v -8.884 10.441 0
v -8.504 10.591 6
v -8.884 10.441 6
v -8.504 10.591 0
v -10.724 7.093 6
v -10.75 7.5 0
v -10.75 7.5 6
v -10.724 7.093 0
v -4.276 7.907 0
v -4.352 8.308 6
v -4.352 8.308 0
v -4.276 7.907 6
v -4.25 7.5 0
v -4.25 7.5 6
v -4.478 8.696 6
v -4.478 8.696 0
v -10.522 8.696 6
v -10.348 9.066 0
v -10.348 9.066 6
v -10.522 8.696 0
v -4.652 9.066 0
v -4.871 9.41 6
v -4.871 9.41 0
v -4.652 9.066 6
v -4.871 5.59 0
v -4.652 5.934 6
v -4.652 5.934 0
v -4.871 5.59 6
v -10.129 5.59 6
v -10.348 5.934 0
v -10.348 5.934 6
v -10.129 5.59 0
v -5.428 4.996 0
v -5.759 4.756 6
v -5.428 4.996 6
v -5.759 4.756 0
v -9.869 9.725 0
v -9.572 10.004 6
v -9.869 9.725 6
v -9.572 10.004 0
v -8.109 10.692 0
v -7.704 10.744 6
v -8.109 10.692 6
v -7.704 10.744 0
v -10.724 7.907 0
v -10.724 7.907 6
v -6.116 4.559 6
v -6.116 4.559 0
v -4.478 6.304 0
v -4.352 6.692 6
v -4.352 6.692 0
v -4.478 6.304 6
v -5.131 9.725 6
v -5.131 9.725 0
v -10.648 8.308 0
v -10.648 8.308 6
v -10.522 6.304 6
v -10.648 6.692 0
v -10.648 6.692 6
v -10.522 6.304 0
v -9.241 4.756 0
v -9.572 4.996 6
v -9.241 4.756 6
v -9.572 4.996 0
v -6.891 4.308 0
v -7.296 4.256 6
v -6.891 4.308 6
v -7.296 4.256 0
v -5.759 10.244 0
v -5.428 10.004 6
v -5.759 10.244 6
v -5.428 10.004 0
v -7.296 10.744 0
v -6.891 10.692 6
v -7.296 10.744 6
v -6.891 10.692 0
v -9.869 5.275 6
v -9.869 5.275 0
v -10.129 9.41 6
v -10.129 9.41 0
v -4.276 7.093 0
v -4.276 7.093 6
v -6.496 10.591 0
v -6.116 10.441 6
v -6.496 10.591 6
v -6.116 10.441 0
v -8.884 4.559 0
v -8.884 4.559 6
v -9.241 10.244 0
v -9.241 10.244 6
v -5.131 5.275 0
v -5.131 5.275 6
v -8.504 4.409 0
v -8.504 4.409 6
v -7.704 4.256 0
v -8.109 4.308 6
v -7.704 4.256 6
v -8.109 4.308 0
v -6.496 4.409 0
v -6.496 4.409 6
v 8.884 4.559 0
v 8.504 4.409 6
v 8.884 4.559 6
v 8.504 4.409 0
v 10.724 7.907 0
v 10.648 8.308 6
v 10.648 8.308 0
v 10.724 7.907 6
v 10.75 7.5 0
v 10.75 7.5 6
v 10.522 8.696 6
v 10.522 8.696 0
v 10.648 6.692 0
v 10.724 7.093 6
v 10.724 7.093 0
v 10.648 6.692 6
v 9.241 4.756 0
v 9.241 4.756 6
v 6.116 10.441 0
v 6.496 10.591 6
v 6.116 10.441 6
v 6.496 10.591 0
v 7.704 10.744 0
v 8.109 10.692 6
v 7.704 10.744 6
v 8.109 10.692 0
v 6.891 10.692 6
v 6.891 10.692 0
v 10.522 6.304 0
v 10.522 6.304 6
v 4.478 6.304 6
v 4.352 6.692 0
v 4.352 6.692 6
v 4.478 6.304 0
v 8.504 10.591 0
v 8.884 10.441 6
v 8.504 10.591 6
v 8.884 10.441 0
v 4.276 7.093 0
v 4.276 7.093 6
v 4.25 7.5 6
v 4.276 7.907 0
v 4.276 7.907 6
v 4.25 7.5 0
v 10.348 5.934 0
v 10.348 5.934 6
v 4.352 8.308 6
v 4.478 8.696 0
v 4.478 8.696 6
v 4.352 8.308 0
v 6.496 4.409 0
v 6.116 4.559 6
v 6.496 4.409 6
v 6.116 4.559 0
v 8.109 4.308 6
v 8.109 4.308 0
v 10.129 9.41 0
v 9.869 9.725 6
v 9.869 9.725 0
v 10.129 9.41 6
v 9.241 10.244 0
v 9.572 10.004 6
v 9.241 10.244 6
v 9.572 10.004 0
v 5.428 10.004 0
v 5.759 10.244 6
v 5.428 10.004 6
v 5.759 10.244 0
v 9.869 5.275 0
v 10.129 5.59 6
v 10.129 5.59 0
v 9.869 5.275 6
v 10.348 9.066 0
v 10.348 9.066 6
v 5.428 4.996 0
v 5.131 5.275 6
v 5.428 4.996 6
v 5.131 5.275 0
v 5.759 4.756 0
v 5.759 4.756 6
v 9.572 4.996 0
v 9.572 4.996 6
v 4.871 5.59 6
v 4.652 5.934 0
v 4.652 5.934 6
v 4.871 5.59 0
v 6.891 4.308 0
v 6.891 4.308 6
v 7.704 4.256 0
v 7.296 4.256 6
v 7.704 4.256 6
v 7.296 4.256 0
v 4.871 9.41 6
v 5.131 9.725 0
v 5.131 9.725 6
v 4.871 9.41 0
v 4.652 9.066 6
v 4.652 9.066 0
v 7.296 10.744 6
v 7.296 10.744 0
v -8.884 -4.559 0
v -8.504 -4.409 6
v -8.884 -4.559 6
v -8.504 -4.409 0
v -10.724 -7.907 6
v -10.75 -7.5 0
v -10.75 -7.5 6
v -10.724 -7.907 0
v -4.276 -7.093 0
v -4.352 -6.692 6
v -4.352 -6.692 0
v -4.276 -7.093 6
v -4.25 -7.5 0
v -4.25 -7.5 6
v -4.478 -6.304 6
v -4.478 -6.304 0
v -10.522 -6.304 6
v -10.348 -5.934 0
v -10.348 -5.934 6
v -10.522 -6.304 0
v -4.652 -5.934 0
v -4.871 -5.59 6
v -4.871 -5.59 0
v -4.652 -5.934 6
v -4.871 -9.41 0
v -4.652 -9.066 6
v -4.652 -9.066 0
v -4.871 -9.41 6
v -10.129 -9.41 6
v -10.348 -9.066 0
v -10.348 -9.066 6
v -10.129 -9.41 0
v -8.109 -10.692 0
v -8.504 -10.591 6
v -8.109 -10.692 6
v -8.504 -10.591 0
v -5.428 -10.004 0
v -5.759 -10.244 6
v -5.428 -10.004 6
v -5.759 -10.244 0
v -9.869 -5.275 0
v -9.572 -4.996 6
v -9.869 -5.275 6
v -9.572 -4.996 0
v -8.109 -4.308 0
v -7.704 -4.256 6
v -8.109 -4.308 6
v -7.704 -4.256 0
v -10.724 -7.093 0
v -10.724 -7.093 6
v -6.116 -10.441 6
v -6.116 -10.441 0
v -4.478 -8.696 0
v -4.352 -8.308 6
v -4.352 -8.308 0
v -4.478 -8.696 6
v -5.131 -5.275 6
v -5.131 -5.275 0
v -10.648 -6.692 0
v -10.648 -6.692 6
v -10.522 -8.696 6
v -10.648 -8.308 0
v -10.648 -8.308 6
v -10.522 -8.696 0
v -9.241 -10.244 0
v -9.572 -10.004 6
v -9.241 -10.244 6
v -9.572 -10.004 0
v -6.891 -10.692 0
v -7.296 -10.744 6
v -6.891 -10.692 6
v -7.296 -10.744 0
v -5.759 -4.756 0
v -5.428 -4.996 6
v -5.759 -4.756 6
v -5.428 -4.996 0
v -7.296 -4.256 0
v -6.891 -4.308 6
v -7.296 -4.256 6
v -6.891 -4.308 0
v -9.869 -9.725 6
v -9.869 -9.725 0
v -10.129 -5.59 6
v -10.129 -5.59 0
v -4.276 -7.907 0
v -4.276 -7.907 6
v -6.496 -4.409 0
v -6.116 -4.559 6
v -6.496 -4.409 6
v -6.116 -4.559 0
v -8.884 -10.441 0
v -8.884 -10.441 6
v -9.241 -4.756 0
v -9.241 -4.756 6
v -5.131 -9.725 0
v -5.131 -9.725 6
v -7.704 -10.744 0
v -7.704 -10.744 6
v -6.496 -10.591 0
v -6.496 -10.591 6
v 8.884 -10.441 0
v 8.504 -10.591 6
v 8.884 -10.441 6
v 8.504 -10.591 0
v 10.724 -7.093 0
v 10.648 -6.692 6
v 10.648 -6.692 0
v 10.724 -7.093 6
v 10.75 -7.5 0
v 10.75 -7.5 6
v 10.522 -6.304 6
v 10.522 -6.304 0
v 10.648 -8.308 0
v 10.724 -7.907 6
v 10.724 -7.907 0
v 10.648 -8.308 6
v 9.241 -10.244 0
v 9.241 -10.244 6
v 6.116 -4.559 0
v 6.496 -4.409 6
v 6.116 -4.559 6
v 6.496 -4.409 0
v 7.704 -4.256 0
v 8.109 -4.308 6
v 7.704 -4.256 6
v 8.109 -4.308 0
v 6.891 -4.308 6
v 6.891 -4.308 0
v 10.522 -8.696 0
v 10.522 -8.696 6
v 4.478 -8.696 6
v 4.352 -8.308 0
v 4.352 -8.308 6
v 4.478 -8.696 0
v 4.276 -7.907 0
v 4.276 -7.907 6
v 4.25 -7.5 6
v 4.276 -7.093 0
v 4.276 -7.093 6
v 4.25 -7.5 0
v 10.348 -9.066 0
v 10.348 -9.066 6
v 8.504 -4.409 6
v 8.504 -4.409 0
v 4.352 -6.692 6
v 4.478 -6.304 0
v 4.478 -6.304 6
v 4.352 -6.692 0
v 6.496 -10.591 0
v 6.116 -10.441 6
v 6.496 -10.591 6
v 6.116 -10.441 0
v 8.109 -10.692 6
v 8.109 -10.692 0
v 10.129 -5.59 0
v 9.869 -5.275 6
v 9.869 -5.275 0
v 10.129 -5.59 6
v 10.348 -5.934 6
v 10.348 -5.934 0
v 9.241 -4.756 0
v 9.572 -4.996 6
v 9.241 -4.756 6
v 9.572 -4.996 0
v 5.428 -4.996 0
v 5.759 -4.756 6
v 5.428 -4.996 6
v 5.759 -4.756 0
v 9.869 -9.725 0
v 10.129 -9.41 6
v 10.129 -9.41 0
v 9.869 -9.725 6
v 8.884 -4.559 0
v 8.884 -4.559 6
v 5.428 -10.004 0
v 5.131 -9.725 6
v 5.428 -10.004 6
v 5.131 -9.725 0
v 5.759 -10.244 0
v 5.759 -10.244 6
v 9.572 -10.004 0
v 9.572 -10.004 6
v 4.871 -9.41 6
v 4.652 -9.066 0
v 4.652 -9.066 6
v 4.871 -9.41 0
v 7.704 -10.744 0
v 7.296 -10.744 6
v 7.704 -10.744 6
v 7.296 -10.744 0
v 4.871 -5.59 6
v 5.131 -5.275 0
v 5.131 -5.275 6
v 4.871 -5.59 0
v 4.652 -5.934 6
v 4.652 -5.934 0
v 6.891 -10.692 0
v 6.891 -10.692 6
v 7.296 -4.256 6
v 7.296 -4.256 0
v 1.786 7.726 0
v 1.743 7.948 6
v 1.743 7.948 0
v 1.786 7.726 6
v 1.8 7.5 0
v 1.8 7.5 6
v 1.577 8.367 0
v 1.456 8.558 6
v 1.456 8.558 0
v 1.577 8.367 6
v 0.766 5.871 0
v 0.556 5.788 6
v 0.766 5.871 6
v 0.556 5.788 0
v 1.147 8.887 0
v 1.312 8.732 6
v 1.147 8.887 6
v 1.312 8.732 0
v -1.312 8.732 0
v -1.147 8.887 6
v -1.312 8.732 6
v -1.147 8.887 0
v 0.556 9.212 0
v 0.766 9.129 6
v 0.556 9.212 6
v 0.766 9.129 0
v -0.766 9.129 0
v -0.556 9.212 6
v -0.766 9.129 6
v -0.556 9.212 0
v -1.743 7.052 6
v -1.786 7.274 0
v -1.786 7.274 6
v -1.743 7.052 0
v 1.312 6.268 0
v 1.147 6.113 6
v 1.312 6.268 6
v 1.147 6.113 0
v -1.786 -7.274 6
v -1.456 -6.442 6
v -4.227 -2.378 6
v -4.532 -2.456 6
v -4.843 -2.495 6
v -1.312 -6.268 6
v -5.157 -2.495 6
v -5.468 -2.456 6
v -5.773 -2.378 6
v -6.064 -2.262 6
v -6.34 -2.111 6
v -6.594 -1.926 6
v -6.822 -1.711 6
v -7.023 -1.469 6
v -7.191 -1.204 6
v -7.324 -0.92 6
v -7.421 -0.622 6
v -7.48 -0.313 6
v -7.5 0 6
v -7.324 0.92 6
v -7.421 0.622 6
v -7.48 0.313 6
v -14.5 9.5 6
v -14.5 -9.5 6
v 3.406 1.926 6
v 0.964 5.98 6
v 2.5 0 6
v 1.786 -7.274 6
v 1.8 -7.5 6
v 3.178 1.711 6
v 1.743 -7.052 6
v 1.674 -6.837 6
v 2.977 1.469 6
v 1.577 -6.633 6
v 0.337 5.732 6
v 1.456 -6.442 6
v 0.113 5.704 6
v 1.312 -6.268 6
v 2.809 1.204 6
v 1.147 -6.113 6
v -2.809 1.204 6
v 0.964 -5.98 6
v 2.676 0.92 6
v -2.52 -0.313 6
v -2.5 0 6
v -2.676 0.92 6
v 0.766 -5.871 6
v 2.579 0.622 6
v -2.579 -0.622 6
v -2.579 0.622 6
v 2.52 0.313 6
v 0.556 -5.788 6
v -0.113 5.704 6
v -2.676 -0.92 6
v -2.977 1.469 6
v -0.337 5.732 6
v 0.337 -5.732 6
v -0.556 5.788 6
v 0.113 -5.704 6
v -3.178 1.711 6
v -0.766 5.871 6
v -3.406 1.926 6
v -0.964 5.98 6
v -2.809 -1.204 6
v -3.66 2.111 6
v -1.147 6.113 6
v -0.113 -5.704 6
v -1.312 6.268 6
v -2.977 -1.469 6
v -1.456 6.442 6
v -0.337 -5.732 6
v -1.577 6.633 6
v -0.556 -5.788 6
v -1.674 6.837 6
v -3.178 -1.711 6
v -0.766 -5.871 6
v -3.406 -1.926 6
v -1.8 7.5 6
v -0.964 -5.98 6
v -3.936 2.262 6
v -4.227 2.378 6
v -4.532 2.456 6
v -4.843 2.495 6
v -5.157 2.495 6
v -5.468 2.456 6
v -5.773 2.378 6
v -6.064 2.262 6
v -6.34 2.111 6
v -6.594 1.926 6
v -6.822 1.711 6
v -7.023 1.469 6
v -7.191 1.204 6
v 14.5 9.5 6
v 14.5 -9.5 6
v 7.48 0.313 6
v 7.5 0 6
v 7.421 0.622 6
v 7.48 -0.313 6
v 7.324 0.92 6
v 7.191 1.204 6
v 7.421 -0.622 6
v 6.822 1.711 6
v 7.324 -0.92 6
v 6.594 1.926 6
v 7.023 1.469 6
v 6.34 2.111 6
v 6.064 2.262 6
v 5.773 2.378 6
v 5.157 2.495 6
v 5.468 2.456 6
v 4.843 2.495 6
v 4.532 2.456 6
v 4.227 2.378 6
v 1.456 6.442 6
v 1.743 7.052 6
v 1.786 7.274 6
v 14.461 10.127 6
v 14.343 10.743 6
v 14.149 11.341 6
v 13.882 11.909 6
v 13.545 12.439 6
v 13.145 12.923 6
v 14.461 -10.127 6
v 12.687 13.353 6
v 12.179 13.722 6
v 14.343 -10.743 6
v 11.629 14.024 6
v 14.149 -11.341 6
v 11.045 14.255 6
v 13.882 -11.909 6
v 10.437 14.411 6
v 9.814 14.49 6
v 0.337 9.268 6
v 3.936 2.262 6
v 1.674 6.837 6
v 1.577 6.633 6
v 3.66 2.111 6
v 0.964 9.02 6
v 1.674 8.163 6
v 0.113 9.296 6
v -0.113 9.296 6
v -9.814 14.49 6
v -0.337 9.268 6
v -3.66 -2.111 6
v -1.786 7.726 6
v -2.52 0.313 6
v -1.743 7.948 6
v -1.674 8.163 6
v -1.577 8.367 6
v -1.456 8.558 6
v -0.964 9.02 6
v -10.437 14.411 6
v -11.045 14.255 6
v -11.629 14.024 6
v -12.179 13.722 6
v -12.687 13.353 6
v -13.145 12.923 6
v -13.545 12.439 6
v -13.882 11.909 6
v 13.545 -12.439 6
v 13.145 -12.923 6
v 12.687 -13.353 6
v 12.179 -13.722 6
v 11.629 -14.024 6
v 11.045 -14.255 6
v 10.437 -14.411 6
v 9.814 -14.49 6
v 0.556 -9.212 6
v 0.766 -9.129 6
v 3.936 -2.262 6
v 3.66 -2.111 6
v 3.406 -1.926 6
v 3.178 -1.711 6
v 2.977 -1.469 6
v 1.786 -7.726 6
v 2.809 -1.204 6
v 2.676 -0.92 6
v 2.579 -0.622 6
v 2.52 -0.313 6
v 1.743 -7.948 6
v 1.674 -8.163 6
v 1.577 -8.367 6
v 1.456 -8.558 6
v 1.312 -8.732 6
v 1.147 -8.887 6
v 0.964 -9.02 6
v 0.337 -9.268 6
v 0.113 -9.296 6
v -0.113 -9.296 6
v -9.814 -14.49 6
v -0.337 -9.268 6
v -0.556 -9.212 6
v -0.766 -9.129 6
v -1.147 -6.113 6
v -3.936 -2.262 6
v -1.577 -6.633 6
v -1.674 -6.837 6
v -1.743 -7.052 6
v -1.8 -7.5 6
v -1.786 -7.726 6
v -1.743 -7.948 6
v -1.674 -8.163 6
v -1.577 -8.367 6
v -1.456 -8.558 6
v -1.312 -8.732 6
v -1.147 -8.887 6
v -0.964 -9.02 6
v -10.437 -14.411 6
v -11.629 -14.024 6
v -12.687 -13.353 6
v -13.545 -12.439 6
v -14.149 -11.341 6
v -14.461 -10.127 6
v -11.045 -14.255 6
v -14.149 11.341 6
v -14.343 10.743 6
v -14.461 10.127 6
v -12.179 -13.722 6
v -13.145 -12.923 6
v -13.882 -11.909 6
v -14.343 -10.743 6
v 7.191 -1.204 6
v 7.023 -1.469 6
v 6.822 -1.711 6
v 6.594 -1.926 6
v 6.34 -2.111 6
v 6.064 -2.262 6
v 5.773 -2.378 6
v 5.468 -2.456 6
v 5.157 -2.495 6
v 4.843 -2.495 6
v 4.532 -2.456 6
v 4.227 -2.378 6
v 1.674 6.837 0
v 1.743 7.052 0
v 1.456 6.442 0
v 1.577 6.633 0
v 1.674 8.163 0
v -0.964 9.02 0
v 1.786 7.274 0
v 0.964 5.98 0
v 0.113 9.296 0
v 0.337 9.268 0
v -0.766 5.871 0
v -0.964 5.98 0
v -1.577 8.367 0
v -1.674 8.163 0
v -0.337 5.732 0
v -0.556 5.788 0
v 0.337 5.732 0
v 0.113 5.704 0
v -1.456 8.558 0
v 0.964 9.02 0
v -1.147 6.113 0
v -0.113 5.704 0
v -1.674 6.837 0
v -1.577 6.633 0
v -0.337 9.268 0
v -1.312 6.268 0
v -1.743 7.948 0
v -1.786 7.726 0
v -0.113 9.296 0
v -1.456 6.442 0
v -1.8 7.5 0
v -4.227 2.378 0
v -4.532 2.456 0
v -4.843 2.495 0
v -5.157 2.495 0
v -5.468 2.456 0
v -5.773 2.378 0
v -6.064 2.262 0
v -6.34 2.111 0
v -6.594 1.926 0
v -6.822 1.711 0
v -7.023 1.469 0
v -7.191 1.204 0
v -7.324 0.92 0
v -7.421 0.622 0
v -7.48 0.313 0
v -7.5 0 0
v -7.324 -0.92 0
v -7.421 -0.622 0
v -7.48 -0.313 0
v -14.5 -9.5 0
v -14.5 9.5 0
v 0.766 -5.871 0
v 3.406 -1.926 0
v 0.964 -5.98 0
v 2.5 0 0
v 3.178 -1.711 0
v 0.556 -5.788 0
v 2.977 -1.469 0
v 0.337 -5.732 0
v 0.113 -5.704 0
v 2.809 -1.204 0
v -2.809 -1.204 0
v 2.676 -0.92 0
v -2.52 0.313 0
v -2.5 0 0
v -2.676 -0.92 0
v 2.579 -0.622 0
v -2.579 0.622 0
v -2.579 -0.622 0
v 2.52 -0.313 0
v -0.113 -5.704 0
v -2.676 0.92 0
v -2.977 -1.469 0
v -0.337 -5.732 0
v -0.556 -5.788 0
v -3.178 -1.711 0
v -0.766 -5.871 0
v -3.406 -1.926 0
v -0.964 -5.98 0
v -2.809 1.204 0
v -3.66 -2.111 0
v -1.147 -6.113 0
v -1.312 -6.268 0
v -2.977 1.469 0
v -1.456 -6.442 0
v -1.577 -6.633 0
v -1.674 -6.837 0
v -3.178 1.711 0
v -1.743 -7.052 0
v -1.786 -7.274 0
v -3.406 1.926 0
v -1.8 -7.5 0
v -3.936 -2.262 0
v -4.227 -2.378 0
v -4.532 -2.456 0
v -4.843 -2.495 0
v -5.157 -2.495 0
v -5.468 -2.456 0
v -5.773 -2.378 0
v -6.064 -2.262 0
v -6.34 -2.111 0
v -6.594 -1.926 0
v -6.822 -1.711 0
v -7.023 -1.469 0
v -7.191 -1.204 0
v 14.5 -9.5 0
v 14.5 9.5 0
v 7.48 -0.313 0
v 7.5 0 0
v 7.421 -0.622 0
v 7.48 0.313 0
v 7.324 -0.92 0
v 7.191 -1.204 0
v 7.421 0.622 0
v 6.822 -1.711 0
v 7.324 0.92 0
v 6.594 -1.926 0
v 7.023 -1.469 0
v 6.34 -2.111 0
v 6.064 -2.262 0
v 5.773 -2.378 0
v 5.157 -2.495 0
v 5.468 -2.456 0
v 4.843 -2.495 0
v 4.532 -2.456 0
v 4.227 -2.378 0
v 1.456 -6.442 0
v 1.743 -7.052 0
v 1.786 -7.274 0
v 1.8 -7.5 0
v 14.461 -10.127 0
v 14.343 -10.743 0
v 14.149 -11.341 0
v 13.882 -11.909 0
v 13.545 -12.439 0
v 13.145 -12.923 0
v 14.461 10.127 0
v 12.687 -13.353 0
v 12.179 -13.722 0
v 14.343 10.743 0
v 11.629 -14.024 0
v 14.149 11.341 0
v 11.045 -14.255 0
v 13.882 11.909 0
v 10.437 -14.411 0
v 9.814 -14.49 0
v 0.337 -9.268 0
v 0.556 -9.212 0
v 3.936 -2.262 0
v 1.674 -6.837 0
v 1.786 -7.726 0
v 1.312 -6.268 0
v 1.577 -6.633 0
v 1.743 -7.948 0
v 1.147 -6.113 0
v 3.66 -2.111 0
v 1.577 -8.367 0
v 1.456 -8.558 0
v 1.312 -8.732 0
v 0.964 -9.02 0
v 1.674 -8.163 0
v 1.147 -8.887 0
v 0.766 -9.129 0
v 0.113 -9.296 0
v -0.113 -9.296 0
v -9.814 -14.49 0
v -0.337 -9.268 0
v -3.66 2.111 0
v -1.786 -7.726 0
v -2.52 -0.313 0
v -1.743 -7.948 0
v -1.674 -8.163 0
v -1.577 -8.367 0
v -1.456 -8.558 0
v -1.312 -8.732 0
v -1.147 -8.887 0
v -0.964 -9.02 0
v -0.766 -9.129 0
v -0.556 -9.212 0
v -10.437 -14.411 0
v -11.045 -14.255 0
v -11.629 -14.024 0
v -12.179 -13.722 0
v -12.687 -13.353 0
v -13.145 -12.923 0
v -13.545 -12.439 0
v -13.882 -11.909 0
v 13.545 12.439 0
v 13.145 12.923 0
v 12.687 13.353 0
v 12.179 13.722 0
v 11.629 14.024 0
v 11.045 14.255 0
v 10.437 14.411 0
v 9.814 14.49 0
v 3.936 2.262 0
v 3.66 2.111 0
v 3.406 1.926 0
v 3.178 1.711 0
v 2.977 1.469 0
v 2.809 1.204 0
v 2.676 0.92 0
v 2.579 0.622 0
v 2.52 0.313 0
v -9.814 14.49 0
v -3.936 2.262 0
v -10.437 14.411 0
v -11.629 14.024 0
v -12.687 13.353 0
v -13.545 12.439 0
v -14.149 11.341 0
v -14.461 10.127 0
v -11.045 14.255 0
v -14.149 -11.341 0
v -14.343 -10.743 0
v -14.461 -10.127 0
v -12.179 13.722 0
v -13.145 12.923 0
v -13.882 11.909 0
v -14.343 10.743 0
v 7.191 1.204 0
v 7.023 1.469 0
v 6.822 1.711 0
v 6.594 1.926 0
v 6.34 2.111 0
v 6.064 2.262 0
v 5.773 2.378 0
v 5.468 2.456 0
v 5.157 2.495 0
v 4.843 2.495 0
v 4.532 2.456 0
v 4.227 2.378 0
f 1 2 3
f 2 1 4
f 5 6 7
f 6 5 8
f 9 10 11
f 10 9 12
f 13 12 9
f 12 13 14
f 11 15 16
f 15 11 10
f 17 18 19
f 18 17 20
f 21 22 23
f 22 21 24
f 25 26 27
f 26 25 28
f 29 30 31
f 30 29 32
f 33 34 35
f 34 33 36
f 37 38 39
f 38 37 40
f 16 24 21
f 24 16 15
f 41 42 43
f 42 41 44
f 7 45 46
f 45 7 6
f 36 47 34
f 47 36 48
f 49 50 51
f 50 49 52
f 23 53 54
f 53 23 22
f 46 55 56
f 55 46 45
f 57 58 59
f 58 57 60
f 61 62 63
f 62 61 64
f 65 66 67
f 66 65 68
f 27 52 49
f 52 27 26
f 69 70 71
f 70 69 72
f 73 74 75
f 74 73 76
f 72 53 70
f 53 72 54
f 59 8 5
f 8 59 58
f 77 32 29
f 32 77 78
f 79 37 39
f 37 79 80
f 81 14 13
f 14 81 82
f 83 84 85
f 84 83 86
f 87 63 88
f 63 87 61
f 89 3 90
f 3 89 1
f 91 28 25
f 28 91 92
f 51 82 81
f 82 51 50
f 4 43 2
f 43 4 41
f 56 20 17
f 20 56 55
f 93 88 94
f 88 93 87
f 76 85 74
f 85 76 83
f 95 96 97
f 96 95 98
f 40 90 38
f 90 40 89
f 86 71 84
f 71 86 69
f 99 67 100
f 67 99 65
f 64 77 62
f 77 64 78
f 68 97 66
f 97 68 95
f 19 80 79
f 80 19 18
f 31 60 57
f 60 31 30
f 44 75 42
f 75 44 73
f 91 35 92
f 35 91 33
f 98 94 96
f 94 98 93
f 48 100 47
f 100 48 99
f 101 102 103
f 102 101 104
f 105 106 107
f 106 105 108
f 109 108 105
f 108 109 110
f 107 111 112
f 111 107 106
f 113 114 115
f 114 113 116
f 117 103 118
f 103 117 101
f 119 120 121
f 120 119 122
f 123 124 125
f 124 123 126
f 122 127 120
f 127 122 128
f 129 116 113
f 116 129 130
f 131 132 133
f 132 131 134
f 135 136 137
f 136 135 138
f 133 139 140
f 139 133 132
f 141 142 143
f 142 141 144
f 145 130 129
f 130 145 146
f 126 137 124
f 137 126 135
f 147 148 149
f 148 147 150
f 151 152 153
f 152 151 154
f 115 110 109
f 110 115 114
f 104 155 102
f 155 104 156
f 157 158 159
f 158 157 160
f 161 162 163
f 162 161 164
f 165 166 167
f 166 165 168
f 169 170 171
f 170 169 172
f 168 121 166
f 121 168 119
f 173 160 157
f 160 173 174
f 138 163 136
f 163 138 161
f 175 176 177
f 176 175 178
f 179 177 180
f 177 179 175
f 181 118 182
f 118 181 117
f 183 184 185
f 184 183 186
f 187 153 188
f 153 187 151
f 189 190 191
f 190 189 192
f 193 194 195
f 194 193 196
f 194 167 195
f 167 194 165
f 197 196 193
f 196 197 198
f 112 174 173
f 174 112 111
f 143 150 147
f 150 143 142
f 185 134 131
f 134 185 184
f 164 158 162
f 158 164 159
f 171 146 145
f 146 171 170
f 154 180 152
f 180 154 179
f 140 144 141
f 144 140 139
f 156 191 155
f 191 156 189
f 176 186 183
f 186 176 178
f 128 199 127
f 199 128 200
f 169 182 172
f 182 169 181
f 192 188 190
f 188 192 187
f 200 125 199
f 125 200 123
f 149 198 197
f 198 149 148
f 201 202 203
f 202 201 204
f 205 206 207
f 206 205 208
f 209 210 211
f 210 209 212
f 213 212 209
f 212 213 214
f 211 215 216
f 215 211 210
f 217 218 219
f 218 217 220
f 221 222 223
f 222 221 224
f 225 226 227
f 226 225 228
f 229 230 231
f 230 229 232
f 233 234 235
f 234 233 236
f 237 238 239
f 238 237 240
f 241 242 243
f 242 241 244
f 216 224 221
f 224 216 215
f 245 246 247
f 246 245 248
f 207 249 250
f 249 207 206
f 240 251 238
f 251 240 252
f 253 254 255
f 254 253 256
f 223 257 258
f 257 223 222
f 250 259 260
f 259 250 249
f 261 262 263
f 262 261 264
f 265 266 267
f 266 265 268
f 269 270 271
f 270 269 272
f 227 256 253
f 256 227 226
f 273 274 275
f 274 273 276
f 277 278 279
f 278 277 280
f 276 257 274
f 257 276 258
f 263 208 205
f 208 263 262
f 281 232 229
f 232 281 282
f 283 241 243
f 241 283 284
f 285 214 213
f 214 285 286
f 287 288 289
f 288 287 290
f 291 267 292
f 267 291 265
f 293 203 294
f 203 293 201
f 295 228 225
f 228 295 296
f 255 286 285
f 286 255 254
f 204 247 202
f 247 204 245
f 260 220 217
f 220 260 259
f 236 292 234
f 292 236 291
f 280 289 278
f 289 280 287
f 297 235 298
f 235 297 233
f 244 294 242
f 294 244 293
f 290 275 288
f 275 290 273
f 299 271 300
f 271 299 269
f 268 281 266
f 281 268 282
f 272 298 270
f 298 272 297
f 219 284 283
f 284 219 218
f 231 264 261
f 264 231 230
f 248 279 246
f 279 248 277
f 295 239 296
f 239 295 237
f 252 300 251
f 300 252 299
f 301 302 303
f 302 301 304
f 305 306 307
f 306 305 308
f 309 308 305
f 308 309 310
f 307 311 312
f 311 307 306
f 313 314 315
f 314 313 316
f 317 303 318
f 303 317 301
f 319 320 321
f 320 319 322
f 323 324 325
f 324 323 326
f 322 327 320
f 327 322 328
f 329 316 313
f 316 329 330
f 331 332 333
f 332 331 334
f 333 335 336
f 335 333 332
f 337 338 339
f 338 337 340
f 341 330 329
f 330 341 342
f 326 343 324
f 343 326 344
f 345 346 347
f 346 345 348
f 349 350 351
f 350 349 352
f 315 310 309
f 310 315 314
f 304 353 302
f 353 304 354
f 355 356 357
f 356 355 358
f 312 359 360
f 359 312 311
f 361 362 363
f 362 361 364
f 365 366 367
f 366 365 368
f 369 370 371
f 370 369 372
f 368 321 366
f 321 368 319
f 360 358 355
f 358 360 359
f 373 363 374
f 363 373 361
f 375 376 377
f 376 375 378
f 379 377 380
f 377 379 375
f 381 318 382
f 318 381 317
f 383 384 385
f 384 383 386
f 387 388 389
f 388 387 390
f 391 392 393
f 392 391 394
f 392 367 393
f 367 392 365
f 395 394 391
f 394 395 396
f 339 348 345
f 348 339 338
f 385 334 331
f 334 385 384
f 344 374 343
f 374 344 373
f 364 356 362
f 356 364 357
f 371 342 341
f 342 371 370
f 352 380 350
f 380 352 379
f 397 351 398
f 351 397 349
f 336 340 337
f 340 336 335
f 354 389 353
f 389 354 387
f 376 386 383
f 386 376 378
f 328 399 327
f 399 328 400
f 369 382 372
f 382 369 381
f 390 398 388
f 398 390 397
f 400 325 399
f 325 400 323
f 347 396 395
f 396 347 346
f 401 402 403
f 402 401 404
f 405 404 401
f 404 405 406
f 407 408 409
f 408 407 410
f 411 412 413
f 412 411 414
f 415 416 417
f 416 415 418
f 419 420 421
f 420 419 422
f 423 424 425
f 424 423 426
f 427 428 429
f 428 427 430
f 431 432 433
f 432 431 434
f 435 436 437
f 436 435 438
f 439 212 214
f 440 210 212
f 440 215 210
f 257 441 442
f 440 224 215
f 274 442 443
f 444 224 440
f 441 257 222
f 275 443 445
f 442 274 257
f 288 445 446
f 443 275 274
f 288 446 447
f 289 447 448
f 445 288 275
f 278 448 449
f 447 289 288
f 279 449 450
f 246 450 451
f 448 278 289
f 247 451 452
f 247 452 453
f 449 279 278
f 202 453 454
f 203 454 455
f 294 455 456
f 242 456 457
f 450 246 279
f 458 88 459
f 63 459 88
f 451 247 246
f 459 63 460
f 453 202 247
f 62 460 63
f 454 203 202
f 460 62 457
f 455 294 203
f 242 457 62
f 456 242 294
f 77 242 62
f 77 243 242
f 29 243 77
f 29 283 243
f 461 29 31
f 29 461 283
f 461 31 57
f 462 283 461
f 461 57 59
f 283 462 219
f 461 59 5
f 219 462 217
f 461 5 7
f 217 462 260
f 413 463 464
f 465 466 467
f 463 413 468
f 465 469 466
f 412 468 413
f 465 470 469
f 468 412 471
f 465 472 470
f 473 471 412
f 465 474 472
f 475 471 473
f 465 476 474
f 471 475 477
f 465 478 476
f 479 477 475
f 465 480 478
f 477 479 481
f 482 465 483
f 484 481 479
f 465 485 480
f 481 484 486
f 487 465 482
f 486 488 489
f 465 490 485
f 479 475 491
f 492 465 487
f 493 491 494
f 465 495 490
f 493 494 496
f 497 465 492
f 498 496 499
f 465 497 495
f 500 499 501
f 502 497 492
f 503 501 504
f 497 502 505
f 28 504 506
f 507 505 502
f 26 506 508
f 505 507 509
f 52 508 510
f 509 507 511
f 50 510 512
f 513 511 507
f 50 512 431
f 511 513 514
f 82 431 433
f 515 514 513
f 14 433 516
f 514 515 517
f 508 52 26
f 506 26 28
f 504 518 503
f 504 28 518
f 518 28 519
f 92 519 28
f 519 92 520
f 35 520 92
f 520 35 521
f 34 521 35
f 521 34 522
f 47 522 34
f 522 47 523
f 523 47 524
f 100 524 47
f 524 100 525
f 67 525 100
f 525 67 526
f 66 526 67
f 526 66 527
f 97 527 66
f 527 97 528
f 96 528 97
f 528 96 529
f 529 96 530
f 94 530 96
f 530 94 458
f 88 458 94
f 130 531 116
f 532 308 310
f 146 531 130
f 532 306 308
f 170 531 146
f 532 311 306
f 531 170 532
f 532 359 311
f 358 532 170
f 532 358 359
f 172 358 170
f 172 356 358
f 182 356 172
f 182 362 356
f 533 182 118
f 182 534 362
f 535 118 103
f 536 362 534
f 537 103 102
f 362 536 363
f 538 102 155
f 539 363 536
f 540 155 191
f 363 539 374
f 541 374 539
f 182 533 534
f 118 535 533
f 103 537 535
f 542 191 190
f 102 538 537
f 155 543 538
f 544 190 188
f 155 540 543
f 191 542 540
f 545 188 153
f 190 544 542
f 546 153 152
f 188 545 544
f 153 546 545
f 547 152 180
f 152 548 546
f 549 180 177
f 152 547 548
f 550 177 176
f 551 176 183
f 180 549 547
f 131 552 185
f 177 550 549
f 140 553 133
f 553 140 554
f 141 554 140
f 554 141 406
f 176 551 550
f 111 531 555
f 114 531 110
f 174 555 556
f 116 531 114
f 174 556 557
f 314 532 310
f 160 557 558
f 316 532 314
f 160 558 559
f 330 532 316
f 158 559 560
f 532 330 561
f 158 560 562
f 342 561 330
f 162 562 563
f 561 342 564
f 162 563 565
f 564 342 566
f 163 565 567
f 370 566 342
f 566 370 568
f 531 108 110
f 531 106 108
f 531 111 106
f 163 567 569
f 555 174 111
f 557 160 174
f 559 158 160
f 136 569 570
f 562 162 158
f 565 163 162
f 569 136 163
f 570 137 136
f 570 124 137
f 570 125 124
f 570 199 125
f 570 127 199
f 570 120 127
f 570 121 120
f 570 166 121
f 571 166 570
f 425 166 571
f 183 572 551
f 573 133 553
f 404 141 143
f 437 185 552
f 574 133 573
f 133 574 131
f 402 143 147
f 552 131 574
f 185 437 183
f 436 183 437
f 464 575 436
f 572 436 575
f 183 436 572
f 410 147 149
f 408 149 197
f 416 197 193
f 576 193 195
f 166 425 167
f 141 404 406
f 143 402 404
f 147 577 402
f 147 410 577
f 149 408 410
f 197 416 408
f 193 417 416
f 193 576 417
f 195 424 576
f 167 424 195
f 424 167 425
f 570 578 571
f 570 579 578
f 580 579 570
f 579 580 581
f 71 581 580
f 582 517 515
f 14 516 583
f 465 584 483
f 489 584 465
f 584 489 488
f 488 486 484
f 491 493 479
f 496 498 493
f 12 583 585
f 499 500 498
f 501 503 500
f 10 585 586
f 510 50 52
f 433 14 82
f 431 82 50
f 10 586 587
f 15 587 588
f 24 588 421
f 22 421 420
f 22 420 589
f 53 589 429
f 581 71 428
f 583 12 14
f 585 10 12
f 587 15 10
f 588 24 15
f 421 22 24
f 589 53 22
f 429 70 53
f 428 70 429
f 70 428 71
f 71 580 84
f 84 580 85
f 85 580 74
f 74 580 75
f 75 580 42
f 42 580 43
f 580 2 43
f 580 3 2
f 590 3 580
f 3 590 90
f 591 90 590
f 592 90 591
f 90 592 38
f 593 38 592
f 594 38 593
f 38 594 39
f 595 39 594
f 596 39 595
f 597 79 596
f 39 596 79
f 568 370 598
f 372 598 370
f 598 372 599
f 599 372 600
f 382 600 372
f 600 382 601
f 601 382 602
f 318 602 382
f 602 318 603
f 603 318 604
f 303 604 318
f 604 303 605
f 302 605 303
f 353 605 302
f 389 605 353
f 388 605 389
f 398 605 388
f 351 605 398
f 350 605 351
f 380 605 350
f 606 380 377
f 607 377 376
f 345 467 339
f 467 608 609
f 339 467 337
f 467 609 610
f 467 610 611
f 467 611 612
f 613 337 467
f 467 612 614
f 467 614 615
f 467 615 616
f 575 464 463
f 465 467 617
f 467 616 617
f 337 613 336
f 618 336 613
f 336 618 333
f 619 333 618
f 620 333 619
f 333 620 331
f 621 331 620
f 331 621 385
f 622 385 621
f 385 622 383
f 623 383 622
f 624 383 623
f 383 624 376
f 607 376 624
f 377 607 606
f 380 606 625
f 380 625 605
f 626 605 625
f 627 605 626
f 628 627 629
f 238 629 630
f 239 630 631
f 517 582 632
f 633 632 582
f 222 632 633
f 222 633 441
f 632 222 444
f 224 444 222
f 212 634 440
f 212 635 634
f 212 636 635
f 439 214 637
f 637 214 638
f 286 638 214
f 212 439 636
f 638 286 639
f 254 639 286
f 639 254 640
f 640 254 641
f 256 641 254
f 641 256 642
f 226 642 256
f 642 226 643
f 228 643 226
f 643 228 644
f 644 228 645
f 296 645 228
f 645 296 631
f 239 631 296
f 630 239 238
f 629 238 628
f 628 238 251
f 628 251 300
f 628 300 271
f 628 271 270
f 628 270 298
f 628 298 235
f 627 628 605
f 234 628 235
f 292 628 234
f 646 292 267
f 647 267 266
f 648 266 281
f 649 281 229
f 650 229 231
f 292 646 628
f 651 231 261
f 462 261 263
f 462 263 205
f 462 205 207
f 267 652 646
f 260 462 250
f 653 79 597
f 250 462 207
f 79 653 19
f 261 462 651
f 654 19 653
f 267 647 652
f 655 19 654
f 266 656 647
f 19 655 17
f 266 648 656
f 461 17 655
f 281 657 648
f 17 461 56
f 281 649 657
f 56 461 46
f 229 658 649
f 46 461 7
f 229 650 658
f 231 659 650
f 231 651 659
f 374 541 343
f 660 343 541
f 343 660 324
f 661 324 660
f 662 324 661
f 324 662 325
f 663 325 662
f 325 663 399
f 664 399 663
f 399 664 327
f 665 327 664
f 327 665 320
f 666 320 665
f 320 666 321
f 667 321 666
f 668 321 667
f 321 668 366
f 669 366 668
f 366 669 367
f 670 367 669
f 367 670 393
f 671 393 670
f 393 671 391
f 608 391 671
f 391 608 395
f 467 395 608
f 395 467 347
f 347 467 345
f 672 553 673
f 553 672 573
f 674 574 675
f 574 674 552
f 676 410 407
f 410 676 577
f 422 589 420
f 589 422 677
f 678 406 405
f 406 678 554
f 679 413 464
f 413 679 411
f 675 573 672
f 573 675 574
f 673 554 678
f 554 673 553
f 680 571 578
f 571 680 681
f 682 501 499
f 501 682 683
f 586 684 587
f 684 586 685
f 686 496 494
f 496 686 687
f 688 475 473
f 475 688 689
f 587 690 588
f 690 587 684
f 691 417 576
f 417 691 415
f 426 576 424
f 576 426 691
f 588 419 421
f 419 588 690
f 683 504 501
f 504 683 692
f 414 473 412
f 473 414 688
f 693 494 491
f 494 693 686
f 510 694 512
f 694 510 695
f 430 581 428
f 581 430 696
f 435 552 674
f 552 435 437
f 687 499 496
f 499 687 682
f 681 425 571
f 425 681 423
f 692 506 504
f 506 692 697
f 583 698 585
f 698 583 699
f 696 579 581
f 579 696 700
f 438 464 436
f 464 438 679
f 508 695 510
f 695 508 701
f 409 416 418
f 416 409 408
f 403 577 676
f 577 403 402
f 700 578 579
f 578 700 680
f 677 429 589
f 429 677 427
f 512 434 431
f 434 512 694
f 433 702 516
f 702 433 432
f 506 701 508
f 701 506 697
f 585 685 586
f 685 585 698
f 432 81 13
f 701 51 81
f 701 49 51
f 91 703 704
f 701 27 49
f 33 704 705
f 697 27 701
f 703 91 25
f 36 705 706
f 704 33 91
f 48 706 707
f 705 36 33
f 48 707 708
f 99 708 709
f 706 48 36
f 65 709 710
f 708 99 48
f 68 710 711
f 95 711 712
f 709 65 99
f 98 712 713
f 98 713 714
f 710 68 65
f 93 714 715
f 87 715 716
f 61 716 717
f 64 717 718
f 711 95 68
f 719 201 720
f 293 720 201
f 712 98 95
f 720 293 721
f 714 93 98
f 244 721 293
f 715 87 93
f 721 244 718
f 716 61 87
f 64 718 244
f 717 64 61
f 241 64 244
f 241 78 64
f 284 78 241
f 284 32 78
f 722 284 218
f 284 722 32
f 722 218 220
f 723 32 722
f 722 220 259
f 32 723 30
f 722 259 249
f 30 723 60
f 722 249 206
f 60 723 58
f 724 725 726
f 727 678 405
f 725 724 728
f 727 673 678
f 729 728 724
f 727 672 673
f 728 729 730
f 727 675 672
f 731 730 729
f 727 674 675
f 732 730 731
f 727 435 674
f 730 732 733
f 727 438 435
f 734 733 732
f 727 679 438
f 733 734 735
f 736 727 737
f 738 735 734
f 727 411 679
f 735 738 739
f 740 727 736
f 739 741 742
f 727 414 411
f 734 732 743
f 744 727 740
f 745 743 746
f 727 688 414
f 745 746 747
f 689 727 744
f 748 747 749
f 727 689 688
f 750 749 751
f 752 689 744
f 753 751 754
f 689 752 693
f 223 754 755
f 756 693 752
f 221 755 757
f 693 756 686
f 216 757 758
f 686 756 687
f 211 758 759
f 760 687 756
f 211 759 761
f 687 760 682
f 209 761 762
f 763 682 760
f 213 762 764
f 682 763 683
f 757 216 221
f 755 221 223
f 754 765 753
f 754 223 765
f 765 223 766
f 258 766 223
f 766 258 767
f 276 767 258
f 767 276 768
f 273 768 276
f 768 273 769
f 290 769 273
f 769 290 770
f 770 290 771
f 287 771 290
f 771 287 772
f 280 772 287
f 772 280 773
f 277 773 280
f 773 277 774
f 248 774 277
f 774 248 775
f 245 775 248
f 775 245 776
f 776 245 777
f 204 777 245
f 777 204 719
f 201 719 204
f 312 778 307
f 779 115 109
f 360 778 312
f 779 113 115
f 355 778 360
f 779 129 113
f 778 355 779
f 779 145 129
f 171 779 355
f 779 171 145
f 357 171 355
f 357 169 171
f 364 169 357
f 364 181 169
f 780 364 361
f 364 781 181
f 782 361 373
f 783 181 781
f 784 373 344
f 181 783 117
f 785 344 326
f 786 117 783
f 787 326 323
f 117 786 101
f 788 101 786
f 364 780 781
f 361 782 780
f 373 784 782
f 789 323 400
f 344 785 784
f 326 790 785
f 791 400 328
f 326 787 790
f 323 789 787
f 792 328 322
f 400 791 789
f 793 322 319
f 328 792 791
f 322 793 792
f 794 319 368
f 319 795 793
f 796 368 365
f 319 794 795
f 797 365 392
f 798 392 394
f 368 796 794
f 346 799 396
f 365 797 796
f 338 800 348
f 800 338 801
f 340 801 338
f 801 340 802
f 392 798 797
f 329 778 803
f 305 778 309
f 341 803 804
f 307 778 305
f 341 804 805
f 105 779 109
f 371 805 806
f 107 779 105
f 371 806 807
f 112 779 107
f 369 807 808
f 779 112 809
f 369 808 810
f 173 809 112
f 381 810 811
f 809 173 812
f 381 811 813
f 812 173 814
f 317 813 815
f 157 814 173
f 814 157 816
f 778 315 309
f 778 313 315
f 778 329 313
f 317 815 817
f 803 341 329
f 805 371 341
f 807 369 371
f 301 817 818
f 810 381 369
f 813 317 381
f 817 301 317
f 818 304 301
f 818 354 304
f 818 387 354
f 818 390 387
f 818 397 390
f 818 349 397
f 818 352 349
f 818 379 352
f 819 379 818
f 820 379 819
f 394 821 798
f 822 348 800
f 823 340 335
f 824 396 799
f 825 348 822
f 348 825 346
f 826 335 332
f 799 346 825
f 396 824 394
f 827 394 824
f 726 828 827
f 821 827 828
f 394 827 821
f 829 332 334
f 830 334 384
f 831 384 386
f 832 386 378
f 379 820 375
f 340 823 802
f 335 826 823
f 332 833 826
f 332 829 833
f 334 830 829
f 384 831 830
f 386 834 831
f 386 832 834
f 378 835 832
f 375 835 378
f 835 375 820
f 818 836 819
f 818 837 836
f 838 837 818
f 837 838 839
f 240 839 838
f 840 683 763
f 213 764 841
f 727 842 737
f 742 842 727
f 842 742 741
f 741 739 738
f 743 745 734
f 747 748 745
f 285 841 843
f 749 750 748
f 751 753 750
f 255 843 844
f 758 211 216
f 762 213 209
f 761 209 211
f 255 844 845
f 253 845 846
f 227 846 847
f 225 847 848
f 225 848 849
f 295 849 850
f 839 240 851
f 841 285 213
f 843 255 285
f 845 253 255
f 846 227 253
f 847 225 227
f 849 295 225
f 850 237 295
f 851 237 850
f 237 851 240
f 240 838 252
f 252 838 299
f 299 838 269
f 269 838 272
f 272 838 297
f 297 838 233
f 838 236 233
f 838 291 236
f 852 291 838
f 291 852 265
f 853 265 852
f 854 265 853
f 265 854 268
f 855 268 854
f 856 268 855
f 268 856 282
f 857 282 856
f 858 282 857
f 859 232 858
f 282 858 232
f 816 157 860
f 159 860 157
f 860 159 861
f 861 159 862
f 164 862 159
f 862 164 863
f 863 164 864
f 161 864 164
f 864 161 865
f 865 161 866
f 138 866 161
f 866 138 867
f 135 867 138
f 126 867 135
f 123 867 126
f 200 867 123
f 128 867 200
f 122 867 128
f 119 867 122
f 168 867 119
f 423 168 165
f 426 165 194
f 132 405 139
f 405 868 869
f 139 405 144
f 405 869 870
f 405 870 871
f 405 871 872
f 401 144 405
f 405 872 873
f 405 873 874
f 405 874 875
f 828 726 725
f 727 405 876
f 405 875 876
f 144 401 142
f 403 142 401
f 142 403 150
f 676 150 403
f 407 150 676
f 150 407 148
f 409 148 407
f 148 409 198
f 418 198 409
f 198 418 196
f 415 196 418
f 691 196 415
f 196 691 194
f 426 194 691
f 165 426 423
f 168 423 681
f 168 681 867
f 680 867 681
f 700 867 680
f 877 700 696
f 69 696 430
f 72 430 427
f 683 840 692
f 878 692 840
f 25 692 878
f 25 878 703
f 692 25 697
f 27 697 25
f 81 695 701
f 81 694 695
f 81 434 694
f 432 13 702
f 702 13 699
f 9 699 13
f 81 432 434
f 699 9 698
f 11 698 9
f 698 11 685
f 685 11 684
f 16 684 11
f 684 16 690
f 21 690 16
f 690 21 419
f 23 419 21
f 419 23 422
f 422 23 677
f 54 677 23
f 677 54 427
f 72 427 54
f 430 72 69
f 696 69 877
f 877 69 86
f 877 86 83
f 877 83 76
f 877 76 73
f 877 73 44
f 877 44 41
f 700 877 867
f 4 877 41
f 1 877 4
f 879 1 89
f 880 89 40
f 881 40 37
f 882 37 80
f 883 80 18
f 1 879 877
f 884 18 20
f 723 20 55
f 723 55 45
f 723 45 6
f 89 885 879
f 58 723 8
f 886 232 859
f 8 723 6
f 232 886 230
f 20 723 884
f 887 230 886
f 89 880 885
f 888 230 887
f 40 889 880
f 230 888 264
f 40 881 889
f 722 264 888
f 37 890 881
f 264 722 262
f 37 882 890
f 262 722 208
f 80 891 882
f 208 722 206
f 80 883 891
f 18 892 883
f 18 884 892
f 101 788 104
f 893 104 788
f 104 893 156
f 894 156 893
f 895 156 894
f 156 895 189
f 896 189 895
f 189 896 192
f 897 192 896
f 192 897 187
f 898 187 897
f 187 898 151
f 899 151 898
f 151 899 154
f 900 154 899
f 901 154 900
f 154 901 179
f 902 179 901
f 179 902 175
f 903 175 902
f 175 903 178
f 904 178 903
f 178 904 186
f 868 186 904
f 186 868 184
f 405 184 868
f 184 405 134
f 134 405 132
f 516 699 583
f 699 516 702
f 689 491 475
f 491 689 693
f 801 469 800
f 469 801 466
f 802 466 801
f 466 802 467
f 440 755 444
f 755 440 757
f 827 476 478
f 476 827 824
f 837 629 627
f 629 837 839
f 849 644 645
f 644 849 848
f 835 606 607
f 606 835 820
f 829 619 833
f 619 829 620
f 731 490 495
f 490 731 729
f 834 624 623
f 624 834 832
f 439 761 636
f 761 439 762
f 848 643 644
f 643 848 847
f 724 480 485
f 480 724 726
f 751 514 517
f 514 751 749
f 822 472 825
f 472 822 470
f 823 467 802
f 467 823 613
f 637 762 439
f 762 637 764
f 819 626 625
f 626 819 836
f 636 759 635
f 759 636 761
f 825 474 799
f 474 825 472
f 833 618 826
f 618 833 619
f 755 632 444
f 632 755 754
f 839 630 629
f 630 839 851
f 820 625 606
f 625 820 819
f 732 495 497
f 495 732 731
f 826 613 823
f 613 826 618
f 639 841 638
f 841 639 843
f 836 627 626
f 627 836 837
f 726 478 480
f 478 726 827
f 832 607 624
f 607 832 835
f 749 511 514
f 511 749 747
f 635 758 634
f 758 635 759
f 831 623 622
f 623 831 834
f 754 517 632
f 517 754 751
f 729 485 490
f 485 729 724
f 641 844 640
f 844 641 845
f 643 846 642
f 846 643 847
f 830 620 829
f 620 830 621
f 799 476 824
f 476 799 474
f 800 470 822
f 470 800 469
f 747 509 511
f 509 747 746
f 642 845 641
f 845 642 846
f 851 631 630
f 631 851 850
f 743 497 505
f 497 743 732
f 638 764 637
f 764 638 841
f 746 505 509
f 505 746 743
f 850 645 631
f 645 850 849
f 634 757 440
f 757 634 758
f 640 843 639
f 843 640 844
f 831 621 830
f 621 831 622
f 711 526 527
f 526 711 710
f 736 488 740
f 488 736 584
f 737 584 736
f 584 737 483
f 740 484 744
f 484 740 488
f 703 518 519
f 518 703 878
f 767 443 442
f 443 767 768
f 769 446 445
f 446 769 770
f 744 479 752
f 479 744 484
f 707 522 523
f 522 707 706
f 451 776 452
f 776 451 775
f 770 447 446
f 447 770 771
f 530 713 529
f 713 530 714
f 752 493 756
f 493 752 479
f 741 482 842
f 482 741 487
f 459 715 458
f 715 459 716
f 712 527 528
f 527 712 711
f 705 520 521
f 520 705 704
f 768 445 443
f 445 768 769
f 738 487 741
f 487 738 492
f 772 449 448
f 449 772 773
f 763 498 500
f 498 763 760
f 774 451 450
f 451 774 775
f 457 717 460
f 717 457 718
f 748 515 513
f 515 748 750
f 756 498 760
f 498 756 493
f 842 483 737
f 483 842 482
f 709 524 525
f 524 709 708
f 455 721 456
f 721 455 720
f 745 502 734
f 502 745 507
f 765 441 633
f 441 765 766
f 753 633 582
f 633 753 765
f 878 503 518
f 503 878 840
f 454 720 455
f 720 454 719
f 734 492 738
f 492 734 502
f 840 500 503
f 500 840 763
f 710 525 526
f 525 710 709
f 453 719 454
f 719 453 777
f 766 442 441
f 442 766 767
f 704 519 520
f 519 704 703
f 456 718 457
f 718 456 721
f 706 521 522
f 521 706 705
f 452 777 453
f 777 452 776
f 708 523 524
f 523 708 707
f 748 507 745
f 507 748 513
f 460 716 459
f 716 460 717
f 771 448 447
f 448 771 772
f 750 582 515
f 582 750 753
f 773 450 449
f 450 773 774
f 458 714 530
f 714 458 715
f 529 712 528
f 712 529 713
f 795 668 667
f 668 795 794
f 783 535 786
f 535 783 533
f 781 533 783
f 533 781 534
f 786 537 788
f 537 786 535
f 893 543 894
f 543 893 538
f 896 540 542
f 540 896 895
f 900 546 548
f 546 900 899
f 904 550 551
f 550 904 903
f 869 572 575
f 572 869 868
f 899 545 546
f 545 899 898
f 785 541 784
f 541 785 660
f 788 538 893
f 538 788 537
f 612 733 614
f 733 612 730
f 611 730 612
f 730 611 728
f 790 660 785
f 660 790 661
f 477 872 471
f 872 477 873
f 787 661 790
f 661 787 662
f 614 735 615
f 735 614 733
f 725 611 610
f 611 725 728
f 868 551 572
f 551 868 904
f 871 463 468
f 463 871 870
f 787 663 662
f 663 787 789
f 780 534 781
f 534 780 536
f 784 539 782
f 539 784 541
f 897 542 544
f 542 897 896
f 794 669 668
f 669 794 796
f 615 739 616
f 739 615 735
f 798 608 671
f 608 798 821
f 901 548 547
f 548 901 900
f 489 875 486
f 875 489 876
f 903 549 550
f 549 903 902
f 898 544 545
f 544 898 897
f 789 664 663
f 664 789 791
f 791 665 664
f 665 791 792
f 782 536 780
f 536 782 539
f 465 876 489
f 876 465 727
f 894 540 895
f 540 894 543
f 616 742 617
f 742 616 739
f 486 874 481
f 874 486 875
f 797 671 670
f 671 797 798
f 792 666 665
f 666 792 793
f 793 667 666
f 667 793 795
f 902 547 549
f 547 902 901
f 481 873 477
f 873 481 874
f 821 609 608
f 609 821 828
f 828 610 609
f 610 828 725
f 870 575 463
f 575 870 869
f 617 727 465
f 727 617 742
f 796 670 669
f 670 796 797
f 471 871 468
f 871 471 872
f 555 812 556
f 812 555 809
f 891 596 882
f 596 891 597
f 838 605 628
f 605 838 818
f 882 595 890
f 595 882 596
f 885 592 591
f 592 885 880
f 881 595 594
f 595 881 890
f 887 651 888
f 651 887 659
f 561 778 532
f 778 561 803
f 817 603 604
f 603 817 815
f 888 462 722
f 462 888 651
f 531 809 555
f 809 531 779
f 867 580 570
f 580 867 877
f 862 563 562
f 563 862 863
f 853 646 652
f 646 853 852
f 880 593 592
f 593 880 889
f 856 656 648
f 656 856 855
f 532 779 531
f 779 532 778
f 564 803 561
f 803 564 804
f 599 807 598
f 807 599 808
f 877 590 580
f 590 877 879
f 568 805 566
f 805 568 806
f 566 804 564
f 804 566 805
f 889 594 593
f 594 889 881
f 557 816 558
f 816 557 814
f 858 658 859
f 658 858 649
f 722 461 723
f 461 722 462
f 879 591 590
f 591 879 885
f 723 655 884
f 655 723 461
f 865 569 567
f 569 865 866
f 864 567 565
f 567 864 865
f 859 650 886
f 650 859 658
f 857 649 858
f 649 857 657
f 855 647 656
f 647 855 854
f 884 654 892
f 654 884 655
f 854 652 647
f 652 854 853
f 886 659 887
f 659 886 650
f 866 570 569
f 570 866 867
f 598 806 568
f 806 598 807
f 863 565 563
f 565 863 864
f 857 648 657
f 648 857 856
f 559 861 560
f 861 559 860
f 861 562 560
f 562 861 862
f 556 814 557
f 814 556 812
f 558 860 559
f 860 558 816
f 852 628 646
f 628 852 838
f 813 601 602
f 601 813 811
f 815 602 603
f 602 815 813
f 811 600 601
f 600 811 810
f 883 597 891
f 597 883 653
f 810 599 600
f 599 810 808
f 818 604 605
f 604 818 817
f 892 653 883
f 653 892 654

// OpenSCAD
$fn = 50;


difference() {
	union() {
		hull() {
			translate(v = [-9.5000000000, 9.5000000000, 0]) {
				cylinder(h = 6, r = 5);
			}
			translate(v = [9.5000000000, 9.5000000000, 0]) {
				cylinder(h = 6, r = 5);
			}
			translate(v = [-9.5000000000, -9.5000000000, 0]) {
				cylinder(h = 6, r = 5);
			}
			translate(v = [9.5000000000, -9.5000000000, 0]) {
				cylinder(h = 6, r = 5);
			}
		}
	}
	union() {
		#translate(v = [-7.5000000000, 7.5000000000, 0]) {
			cylinder(h = 6, r = 3.2500000000);
		}
		#translate(v = [7.5000000000, 7.5000000000, 0]) {
			cylinder(h = 6, r = 3.2500000000);
		}
		#translate(v = [-7.5000000000, -7.5000000000, 0]) {
			cylinder(h = 6, r = 3.2500000000);
		}
		#translate(v = [7.5000000000, -7.5000000000, 0]) {
			cylinder(h = 6, r = 3.2500000000);
		}
		#translate(v = [-7.5000000000, -7.5000000000, -100.0000000000]) {
			cylinder(h = 200, r = 3.2500000000);
		}
		#translate(v = [-7.5000000000, 7.5000000000, -100.0000000000]) {
			cylinder(h = 200, r = 3.2500000000);
		}
		#translate(v = [7.5000000000, -7.5000000000, -100.0000000000]) {
			cylinder(h = 200, r = 3.2500000000);
		}
		#translate(v = [7.5000000000, 7.5000000000, -100.0000000000]) {
			cylinder(h = 200, r = 3.2500000000);
		}
		#translate(v = [-7.5000000000, 7.5000000000, 0]) {
			cylinder(h = 6, r = 1.8000000000);
		}
		#translate(v = [0.0000000000, 7.5000000000, 0]) {
			cylinder(h = 6, r = 1.8000000000);
		}
		#translate(v = [7.5000000000, 7.5000000000, 0]) {
			cylinder(h = 6, r = 1.8000000000);
		}
		#translate(v = [-7.5000000000, -7.5000000000, 0]) {
			cylinder(h = 6, r = 1.8000000000);
		}
		#translate(v = [0.0000000000, -7.5000000000, 0]) {
			cylinder(h = 6, r = 1.8000000000);
		}
		#translate(v = [7.5000000000, -7.5000000000, 0]) {
			cylinder(h = 6, r = 1.8000000000);
		}
		#translate(v = [-7.5000000000, 7.5000000000, 0]) {
			cylinder(h = 6, r = 1.8000000000);
		}
		#translate(v = [0.0000000000, 7.5000000000, 0]) {
			cylinder(h = 6, r = 1.8000000000);
		}
		#translate(v = [7.5000000000, 7.5000000000, 0]) {
			cylinder(h = 6, r = 1.8000000000);
		}
		#translate(v = [-7.5000000000, -7.5000000000, 0]) {
			cylinder(h = 6, r = 1.8000000000);
		}
		#translate(v = [0.0000000000, -7.5000000000, 0]) {
			cylinder(h = 6, r = 1.8000000000);
		}
		#translate(v = [7.5000000000, -7.5000000000, 0]) {
			cylinder(h = 6, r = 1.8000000000);
		}
		#translate(v = [-7.5000000000, 7.5000000000, 0]) {
			cylinder(h = 6, r = 1.8000000000);
		}
		#translate(v = [0.0000000000, 7.5000000000, 0]) {
			cylinder(h = 6, r = 1.8000000000);
		}
		#translate(v = [7.5000000000, 7.5000000000, 0]) {
			cylinder(h = 6, r = 1.8000000000);
		}
		#translate(v = [-7.5000000000, -7.5000000000, 0]) {
			cylinder(h = 6, r = 1.8000000000);
		}
		#translate(v = [0.0000000000, -7.5000000000, 0]) {
			cylinder(h = 6, r = 1.8000000000);
		}
		#translate(v = [7.5000000000, -7.5000000000, 0]) {
			cylinder(h = 6, r = 1.8000000000);
		}
		#translate(v = [-5.0000000000, 0, 0]) {
			cylinder(h = 6, r = 2.5000000000);
		}
		#translate(v = [5.0000000000, 0, 0]) {
			cylinder(h = 6, r = 2.5000000000);
		}
	}
}
